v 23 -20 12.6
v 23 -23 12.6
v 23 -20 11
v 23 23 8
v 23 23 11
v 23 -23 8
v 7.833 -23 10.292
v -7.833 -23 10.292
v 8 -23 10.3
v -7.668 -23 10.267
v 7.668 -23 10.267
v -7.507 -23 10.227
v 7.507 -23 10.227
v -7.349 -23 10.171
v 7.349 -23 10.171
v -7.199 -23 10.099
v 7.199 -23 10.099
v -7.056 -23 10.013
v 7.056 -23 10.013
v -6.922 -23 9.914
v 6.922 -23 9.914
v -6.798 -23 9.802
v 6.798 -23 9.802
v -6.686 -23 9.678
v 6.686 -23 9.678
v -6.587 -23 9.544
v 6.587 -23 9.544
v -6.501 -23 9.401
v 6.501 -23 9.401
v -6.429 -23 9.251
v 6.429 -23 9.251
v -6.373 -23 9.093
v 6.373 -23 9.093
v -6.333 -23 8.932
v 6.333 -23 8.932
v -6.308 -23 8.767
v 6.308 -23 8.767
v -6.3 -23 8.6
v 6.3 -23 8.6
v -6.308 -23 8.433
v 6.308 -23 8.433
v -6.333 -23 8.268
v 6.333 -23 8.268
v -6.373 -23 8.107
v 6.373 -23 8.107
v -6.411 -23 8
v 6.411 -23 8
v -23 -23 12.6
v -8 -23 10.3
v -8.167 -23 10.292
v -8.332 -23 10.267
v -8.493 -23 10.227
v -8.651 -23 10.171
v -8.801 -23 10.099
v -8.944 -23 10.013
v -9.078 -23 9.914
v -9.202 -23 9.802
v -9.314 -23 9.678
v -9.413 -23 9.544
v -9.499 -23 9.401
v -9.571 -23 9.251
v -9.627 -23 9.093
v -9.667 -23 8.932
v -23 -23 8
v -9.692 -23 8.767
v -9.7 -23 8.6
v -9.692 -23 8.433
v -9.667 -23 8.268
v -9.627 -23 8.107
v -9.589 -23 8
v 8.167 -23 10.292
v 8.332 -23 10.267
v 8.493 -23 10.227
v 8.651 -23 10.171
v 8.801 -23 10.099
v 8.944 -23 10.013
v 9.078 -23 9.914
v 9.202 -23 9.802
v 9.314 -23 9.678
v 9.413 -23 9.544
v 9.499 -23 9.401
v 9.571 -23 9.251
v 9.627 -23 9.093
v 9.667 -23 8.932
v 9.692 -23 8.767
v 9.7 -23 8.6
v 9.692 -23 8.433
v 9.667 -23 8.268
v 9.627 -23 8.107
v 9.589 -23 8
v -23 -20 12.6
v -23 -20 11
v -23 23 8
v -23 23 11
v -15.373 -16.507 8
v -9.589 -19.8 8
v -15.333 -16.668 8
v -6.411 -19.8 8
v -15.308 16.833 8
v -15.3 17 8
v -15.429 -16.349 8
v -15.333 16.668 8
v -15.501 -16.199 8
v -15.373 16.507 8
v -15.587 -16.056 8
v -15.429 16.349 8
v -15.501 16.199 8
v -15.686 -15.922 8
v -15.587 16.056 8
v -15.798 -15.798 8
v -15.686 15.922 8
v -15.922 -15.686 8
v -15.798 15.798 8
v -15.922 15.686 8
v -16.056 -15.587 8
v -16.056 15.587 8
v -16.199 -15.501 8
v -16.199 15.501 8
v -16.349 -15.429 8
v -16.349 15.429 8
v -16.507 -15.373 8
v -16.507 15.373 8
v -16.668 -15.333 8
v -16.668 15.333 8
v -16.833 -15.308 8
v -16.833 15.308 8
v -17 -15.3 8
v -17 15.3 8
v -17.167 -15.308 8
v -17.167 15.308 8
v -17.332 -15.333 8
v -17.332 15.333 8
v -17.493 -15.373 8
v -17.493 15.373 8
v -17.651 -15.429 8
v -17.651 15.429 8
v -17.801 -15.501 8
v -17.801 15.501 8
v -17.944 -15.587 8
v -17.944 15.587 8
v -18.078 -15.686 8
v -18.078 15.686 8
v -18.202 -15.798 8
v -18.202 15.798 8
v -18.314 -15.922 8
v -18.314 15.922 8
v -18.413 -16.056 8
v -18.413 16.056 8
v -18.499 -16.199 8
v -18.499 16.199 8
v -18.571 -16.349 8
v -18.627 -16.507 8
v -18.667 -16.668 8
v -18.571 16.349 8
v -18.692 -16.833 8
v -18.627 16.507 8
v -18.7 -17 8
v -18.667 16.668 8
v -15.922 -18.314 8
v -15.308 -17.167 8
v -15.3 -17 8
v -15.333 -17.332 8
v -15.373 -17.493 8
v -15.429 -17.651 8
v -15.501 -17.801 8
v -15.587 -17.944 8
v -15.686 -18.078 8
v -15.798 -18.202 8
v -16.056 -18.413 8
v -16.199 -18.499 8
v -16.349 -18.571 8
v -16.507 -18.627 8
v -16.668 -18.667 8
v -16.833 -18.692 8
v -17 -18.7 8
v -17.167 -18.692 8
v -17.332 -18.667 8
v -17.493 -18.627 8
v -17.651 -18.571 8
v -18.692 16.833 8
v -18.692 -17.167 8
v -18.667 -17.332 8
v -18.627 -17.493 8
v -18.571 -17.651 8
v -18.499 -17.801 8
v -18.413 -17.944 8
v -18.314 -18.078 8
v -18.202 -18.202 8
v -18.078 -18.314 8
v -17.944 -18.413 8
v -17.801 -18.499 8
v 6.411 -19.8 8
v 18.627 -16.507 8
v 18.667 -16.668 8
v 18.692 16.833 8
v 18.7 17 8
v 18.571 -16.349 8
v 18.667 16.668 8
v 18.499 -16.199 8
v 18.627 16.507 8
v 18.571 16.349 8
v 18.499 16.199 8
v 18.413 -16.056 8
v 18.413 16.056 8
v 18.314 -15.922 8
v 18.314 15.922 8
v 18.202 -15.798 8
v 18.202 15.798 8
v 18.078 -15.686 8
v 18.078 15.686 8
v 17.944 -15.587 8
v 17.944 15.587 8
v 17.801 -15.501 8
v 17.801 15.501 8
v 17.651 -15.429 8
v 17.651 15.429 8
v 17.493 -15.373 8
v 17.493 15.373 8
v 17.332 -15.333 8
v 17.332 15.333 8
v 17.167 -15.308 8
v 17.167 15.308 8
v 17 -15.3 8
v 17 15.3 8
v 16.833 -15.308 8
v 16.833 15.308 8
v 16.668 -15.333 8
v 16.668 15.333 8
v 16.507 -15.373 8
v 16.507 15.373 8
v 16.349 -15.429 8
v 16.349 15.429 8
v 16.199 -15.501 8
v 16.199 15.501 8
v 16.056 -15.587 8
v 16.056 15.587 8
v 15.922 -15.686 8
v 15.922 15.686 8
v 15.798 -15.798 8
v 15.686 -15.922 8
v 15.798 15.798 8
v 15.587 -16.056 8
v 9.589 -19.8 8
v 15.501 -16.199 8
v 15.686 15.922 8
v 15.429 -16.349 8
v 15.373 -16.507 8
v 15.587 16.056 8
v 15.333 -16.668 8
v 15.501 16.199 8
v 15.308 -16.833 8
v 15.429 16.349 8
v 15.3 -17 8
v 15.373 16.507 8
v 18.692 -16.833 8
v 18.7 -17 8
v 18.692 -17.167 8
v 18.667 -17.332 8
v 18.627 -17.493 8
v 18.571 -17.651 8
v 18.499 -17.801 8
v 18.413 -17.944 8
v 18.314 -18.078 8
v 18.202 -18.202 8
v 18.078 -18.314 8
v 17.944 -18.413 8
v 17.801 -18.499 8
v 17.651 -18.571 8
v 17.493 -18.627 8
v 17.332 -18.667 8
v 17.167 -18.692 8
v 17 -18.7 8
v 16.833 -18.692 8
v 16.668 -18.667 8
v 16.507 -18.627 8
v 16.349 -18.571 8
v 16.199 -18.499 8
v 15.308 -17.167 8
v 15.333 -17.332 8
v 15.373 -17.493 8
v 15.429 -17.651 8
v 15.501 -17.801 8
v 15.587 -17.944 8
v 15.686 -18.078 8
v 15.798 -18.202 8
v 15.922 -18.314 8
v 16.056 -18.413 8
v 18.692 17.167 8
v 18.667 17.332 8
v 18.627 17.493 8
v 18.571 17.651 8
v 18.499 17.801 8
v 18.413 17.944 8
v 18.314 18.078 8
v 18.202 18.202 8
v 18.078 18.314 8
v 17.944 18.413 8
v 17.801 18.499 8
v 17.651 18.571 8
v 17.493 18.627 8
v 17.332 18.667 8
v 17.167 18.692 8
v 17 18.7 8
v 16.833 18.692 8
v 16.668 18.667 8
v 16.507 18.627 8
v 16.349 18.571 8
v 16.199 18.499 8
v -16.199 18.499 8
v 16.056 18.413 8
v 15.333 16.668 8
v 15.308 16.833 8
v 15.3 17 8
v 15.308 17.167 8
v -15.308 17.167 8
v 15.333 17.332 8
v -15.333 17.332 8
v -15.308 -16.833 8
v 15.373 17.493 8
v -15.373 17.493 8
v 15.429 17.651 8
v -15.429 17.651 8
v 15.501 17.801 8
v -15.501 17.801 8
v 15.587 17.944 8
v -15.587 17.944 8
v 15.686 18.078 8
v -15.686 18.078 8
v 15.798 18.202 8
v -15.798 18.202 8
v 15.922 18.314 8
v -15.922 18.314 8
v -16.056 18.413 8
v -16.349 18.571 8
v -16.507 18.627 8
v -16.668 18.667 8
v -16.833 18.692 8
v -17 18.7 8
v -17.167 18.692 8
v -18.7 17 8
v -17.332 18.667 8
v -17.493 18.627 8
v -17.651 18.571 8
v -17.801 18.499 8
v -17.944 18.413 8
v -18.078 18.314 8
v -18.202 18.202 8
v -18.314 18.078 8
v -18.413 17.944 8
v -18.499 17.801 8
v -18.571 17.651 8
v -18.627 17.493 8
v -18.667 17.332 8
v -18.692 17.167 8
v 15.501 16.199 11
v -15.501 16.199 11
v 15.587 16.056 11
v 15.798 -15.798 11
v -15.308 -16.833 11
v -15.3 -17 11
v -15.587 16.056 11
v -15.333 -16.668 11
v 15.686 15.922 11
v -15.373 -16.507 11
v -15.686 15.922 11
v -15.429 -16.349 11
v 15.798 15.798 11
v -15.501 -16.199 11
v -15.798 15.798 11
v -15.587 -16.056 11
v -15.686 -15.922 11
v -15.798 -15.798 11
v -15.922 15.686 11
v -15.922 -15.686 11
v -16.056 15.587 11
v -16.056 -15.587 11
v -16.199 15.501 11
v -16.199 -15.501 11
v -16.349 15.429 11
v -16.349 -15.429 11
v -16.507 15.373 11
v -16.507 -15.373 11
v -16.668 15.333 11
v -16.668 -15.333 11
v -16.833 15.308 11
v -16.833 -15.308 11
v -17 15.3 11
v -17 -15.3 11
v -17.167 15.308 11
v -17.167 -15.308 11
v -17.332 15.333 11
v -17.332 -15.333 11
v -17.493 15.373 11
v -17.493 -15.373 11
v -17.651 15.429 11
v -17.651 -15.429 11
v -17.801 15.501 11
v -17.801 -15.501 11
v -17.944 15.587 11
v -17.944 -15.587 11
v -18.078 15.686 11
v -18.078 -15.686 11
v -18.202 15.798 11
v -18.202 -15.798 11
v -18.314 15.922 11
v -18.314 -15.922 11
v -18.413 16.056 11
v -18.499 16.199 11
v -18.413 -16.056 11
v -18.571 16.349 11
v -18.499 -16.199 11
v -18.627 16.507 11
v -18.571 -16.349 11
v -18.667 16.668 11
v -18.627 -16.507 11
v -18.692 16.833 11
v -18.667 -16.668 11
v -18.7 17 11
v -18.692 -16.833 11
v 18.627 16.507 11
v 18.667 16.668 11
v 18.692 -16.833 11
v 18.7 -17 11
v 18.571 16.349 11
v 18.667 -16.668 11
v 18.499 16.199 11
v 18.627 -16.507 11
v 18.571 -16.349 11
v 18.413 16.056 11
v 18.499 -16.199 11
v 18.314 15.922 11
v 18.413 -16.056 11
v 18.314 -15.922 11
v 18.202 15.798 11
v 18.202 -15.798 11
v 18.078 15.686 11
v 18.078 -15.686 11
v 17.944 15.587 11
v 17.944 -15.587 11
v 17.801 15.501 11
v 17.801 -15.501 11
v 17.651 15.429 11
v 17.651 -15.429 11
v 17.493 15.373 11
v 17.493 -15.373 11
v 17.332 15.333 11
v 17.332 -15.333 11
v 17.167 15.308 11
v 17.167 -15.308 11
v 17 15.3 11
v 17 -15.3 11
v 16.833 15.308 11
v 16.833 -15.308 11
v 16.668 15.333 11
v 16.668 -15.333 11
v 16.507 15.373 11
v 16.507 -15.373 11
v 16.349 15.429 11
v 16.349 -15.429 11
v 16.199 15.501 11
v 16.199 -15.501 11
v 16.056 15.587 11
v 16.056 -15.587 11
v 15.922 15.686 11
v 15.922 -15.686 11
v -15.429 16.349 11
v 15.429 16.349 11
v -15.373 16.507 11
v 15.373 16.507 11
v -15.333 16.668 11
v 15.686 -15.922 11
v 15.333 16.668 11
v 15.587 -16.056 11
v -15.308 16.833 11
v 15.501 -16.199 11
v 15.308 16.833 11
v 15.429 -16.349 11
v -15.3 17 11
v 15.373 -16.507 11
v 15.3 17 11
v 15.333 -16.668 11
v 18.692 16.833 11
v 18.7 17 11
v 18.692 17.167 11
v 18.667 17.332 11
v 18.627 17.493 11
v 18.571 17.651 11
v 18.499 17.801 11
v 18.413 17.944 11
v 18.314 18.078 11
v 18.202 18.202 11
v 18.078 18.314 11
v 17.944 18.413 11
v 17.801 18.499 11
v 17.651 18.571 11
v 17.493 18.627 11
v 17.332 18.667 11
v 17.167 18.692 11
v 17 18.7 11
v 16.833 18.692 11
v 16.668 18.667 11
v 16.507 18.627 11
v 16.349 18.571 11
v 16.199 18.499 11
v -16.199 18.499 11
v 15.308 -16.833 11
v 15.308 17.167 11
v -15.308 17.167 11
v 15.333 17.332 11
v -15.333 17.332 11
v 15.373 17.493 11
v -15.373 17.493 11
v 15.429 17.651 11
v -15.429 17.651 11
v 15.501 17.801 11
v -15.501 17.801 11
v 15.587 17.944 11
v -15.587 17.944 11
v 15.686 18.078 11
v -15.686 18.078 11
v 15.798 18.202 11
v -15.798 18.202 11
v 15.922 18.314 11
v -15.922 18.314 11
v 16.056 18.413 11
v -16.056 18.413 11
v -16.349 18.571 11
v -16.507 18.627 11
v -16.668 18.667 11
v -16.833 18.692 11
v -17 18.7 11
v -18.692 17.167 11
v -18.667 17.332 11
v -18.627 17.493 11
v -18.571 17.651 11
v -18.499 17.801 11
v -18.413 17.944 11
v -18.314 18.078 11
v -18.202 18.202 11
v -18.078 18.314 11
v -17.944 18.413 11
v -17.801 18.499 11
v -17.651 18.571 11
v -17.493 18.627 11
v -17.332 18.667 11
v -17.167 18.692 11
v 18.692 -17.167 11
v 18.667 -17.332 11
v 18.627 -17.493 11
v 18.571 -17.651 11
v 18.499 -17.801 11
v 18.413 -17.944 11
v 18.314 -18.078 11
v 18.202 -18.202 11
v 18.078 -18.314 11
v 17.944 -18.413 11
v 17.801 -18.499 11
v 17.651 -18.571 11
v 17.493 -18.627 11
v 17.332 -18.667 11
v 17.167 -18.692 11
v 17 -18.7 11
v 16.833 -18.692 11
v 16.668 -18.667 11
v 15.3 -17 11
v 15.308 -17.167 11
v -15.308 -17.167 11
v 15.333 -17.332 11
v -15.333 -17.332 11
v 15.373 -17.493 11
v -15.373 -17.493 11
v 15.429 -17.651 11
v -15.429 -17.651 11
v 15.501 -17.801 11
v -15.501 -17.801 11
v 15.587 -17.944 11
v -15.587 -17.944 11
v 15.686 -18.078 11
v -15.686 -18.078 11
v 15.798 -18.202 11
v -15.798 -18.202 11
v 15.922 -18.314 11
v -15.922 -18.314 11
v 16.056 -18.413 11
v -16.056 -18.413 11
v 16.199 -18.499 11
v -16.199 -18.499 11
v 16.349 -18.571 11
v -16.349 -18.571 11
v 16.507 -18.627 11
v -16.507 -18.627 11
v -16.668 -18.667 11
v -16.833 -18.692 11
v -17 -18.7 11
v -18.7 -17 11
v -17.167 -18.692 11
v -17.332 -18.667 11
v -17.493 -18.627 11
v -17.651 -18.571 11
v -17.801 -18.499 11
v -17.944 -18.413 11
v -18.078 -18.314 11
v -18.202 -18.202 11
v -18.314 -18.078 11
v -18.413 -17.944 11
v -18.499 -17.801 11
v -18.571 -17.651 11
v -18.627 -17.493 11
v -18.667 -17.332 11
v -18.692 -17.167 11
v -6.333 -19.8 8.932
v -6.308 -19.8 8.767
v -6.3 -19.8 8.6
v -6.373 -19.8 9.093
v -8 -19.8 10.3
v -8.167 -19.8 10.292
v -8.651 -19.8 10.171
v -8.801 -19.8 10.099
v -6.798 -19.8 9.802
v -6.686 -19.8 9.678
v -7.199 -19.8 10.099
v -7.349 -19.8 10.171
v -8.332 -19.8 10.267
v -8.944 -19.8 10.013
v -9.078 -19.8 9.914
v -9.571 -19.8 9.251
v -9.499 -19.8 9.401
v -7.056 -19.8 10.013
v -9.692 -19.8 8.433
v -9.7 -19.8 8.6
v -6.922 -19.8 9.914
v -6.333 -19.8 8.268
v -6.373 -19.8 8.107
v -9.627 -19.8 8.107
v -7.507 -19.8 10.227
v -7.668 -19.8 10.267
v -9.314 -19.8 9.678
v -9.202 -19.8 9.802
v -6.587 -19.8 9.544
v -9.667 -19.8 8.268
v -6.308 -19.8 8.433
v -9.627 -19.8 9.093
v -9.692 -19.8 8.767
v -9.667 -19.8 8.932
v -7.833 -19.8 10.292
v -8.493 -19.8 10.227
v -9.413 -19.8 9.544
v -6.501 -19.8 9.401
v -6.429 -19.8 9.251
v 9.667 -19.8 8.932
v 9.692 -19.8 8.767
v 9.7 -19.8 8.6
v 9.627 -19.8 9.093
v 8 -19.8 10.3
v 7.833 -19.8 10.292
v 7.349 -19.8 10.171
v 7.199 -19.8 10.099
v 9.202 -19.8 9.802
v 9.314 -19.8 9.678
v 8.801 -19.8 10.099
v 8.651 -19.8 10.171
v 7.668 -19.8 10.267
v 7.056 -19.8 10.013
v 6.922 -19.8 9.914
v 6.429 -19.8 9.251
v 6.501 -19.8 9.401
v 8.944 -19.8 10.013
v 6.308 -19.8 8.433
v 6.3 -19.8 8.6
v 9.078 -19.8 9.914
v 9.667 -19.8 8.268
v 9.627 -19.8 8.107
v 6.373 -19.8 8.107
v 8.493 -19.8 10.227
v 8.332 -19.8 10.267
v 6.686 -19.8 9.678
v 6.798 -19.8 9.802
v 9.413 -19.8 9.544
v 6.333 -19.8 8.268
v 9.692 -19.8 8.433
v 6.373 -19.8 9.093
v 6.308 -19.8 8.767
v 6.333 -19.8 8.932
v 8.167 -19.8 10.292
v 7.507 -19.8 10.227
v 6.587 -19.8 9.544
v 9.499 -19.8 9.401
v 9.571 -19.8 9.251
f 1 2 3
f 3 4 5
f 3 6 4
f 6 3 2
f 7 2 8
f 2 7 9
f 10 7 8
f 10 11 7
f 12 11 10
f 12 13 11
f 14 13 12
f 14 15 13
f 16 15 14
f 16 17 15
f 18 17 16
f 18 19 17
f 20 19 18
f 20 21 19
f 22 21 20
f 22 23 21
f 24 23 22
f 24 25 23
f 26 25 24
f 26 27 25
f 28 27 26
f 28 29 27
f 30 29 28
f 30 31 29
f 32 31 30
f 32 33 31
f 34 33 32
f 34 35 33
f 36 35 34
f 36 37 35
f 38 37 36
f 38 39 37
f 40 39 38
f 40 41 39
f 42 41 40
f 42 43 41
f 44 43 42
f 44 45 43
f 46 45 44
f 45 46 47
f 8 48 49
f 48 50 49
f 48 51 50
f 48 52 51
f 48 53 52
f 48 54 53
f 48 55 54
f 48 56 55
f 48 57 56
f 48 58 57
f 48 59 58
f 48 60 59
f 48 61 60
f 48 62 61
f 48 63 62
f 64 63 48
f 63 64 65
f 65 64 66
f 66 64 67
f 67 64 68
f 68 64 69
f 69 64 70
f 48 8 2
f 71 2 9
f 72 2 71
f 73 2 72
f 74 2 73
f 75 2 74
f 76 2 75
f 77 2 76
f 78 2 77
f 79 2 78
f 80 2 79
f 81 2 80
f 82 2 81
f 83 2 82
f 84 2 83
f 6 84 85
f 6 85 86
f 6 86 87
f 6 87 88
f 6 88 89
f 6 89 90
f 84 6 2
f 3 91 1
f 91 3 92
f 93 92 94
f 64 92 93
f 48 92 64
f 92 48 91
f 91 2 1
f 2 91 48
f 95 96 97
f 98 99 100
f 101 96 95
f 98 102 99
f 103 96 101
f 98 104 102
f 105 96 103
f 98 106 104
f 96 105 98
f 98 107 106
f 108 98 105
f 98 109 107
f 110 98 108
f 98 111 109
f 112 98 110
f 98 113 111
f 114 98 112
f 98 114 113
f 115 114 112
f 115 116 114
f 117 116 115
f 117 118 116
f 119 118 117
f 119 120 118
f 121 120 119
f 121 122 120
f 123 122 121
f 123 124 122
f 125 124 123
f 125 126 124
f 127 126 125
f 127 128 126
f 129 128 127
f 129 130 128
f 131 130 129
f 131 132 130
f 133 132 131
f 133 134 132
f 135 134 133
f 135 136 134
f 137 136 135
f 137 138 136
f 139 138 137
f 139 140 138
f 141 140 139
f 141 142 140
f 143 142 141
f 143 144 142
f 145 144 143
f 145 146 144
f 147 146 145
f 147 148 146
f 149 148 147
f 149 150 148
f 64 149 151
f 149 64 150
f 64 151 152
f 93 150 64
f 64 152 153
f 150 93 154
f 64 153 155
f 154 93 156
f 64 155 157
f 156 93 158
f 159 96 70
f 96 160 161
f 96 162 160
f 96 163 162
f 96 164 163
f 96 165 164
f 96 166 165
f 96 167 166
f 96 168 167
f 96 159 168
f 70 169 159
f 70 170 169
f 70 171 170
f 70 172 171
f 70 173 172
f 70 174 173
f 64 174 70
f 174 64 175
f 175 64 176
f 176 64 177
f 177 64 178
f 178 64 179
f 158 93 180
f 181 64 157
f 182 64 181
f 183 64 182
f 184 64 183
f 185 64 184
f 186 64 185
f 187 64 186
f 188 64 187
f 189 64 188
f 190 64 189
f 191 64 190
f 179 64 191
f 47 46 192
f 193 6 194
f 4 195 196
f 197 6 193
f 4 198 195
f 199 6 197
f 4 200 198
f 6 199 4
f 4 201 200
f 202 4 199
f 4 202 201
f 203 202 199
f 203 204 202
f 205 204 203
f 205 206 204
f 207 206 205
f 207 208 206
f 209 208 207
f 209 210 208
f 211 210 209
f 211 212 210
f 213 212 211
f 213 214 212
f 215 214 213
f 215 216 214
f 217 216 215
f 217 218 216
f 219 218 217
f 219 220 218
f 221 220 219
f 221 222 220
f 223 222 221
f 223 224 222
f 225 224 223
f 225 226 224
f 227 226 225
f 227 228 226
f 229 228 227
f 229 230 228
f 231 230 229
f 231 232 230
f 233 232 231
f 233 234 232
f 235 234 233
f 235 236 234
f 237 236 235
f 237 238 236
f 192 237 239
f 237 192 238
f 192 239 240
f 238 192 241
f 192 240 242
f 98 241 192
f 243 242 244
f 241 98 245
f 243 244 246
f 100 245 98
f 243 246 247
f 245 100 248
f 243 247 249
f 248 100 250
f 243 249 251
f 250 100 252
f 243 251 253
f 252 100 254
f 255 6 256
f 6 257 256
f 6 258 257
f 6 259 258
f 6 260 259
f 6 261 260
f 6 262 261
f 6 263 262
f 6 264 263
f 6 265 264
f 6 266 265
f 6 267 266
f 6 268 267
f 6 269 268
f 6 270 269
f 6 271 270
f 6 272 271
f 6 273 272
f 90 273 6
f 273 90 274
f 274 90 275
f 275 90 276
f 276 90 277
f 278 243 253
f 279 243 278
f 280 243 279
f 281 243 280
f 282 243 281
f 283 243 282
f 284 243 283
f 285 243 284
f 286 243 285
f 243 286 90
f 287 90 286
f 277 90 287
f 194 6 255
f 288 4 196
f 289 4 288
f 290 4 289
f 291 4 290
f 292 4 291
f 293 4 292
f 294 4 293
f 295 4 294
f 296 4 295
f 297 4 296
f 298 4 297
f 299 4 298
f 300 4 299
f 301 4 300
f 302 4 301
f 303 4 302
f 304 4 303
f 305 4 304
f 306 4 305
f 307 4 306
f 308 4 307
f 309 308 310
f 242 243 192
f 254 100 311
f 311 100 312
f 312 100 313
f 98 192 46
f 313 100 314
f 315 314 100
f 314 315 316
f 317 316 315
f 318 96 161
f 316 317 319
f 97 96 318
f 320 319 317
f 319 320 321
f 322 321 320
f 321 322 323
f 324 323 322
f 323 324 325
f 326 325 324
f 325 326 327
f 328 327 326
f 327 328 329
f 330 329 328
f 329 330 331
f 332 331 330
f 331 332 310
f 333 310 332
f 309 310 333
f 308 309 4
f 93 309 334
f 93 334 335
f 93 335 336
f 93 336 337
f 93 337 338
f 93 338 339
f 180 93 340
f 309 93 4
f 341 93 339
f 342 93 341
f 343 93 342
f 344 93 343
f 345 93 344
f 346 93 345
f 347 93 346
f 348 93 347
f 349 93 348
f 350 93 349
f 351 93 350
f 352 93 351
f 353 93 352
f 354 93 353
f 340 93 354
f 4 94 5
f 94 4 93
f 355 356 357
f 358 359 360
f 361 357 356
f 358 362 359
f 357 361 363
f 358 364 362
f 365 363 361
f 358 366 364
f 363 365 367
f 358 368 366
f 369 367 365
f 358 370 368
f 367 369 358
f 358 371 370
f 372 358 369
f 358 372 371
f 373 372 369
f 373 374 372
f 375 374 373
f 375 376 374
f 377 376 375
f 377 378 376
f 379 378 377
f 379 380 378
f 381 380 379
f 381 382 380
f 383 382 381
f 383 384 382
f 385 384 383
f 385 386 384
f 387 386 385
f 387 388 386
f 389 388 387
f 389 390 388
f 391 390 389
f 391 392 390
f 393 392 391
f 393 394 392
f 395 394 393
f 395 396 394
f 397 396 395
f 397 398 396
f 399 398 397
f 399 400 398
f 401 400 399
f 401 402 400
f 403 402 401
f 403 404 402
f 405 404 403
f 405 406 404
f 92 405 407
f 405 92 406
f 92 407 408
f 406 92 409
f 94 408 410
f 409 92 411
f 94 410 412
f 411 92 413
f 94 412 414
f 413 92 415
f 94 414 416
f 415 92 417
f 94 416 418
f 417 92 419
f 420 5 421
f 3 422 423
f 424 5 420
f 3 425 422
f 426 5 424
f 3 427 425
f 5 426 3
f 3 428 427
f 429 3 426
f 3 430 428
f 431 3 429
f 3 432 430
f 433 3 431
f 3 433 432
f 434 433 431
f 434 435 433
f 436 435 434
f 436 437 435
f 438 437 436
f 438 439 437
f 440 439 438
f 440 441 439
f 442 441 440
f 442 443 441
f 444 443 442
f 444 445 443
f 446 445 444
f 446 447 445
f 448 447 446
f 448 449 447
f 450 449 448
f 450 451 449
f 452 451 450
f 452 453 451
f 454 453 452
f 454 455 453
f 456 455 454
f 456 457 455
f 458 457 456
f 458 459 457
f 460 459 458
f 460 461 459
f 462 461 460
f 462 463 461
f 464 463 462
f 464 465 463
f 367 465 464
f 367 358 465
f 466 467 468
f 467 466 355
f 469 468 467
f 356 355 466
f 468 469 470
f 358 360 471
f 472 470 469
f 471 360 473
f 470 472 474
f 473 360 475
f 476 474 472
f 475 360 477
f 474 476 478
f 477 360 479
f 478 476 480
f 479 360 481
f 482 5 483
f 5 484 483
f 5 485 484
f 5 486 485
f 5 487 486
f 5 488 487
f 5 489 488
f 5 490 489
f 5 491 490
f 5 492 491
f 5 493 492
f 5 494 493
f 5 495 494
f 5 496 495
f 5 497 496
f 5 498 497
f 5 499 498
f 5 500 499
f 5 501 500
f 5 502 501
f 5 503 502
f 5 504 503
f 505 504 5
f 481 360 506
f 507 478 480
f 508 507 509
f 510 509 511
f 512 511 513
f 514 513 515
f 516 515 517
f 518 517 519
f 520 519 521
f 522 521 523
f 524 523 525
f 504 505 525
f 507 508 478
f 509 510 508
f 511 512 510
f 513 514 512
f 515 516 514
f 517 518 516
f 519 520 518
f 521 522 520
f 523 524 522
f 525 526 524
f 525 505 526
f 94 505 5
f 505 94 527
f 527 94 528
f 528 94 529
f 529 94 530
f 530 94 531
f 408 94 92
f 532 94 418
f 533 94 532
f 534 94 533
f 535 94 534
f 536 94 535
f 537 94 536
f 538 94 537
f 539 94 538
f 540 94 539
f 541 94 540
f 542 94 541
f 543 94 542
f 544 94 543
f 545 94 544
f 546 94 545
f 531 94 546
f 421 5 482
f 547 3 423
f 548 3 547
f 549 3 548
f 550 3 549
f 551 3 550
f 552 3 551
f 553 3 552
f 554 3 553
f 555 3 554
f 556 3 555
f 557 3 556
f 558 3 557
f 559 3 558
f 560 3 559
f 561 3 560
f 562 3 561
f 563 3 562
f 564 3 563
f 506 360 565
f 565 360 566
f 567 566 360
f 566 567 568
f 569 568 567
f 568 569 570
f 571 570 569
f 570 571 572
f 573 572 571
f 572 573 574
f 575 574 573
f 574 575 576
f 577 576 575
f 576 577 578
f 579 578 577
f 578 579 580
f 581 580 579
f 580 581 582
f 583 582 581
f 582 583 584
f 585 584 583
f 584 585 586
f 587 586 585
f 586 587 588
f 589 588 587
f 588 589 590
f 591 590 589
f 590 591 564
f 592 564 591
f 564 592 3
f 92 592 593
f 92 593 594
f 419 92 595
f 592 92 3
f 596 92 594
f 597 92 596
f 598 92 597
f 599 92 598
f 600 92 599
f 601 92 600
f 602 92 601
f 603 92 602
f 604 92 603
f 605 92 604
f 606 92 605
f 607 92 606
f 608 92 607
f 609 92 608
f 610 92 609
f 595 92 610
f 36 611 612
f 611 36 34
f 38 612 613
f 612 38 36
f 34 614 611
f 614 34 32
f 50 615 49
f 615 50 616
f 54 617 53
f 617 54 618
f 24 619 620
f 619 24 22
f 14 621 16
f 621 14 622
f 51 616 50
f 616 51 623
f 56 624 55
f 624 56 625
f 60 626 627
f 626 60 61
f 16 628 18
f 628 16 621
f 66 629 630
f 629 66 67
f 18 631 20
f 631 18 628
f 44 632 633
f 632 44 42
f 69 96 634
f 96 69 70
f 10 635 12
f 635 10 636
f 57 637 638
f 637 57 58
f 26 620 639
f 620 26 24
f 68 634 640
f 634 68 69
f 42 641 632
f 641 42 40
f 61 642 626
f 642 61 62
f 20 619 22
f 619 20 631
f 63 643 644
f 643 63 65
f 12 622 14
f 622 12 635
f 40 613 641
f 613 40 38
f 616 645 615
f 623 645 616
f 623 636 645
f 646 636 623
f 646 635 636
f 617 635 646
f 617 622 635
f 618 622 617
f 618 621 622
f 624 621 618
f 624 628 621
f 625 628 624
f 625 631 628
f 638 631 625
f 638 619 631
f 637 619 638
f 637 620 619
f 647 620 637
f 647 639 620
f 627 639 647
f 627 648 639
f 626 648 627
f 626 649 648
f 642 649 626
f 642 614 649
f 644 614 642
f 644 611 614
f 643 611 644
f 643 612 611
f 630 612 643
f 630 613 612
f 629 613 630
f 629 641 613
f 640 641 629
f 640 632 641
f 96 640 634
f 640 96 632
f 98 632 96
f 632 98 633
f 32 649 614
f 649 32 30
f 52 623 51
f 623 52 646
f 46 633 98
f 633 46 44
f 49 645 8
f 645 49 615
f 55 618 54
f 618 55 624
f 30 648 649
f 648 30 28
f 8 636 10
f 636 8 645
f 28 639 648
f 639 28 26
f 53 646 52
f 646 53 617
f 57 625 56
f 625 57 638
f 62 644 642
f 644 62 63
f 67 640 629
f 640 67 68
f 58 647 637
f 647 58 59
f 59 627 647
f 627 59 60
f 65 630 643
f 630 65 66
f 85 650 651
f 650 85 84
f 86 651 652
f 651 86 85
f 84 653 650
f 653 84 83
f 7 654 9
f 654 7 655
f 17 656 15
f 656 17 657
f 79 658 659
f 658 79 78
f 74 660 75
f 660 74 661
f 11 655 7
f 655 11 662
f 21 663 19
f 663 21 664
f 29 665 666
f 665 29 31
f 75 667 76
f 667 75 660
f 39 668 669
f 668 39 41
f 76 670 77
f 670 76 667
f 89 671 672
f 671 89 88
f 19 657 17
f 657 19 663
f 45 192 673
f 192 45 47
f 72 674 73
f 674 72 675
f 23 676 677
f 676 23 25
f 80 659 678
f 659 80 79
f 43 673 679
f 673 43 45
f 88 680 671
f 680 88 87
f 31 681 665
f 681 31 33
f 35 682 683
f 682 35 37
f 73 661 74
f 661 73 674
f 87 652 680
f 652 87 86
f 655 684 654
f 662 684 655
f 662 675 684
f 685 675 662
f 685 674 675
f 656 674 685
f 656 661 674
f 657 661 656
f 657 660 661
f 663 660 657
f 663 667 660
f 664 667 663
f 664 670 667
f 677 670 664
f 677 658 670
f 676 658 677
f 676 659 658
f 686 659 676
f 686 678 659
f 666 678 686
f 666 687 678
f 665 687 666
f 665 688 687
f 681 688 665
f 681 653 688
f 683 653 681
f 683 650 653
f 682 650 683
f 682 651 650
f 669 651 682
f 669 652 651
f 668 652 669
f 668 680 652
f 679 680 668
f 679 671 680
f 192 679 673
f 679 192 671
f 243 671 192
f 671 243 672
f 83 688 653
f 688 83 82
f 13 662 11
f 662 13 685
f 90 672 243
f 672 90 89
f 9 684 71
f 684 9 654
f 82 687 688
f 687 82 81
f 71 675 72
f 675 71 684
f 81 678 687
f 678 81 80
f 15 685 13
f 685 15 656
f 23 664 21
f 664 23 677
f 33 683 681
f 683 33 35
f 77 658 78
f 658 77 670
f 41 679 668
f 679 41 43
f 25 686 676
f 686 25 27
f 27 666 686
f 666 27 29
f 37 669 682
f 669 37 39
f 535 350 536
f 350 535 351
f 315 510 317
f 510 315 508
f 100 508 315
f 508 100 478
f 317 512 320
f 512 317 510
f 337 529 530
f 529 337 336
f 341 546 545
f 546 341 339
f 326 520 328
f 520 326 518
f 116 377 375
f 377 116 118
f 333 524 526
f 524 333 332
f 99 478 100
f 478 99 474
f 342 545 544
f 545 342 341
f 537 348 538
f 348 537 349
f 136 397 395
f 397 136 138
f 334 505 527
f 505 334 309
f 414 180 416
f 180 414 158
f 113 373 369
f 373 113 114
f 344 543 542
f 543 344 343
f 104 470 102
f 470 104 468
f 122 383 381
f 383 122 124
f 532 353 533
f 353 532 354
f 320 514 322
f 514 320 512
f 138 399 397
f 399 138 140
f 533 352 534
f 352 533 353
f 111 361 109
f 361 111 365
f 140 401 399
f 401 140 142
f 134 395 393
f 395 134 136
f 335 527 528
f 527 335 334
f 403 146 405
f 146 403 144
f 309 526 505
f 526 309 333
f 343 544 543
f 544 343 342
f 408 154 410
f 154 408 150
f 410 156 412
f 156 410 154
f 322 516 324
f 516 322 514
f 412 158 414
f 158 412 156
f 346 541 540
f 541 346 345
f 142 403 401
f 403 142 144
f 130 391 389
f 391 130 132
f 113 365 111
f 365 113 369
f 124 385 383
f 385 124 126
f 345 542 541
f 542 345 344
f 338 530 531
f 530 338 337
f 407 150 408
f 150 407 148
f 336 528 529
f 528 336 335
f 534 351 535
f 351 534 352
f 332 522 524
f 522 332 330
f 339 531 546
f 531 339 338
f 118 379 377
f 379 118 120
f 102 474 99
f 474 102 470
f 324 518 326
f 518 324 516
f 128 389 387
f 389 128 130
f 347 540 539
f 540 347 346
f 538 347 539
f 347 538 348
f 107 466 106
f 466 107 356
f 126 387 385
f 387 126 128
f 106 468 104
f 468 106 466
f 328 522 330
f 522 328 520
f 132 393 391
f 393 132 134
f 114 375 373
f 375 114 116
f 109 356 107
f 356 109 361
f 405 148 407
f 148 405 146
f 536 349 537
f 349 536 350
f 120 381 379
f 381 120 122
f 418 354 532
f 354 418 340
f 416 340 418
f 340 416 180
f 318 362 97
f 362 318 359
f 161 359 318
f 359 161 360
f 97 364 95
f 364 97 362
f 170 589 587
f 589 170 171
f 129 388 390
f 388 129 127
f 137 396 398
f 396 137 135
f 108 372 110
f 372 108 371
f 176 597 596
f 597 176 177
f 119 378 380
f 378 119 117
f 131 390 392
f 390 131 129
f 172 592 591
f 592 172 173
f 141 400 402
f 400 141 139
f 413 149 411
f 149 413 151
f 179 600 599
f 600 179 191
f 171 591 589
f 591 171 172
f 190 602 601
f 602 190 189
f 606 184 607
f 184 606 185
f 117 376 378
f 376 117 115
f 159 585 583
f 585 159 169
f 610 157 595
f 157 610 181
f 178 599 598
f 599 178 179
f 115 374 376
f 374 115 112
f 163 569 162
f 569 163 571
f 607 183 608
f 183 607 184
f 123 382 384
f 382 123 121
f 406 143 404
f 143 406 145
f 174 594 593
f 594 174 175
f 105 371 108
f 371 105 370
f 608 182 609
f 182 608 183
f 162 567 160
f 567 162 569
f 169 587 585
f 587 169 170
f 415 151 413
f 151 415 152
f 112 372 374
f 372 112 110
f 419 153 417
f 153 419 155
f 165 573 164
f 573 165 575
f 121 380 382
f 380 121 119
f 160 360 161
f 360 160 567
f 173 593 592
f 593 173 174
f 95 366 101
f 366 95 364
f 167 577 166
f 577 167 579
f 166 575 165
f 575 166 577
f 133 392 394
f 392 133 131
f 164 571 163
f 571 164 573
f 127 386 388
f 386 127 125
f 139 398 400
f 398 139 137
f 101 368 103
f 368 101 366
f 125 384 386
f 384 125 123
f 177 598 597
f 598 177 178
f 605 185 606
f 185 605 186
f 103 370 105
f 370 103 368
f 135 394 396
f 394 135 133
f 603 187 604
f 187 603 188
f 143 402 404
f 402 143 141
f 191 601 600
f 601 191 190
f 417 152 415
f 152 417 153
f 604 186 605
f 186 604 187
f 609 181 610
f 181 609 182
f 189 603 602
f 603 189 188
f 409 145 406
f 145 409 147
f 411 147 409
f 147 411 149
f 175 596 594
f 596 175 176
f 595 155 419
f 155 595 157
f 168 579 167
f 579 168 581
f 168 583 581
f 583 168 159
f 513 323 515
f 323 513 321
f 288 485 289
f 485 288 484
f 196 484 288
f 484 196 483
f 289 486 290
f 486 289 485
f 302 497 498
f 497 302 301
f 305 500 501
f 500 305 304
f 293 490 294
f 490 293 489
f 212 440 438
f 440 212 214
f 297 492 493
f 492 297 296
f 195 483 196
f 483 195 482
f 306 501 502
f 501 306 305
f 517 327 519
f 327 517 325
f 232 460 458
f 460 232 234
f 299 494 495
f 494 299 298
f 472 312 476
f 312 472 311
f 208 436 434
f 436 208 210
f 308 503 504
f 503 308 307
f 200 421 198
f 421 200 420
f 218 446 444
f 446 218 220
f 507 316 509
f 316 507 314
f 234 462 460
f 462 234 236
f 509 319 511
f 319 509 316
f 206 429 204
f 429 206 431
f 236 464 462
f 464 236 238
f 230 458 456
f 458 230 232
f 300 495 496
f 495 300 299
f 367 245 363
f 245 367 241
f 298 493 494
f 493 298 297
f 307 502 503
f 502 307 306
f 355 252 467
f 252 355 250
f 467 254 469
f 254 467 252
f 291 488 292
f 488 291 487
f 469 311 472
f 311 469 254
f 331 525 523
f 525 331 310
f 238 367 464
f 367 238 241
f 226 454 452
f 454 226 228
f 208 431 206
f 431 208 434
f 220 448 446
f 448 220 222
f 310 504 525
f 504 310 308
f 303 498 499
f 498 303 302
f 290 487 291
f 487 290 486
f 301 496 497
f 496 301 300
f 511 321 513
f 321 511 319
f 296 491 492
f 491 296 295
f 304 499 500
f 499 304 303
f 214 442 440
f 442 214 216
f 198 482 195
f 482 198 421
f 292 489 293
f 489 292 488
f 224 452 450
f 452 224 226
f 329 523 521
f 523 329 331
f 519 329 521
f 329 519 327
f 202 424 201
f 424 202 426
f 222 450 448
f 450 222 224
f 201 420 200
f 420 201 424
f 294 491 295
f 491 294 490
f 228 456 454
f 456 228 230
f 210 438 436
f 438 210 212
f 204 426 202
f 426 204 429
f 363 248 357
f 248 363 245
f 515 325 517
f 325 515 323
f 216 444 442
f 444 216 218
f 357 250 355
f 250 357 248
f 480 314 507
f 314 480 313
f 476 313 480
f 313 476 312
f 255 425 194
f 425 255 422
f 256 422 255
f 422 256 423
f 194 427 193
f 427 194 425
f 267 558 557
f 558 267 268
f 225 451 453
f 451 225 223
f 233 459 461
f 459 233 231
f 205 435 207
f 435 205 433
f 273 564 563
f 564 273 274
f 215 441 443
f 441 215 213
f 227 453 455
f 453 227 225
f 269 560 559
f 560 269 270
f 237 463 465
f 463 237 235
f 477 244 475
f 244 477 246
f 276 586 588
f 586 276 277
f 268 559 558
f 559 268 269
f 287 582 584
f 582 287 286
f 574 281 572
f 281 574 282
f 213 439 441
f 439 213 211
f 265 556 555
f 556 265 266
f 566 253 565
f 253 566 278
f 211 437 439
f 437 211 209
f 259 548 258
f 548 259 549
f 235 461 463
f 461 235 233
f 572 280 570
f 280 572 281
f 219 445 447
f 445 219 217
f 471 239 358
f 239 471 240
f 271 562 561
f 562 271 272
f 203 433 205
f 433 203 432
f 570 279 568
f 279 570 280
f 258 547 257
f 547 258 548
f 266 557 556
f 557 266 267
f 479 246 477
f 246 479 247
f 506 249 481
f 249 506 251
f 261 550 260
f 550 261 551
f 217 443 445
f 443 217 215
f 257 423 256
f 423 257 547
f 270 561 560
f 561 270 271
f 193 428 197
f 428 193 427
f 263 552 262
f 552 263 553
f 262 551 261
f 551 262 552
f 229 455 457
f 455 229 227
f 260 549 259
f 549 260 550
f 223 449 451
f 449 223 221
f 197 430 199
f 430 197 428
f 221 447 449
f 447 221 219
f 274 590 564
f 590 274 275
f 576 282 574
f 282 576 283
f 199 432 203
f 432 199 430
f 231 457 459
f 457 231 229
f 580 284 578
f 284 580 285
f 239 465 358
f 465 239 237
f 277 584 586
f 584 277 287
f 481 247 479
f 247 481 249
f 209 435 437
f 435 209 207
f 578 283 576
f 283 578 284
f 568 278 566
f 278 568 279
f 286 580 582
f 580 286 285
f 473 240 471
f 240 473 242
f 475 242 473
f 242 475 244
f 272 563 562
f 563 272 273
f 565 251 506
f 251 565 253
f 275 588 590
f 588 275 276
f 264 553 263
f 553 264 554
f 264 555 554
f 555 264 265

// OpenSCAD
// Standalone v5.3 ankle PCB L-bracket for the 42 mm AS5047P module
// (Coupang 하이제니스, magnet included, side SMT 6-pin SPI socket).
// Vertical plate (46 wide) backs the full board and takes FOUR M3
// self-taps on the 37 mm corner grid (pilot 2.7, (*) measure on
// arrival). The top bar starts at the plate front plane and runs aft
// under the carrier bridge - M3 CLEARANCE (3.4) through-holes in the
// bar, self-tap PILOTS (2.7) in the bridge, screw row behind the plate
// so the driver has a straight shot from below. The board's SMT
// connector exits -X sideways through the open carrier center.
// Print orientation (set in frame_v5): plate flat on the bed, bar as a
// vertical wall - no supports.
// Assembly: screw the PCB to the plate FIRST, then bolt the bar to the
// bridge from the open center of the carrier.
// Edit shared dimensions in frame_v5.scad so everything stays linked.

part_mode = "ankle_pcb_bracket";
print_export = true;

include <frame_master.scad>
